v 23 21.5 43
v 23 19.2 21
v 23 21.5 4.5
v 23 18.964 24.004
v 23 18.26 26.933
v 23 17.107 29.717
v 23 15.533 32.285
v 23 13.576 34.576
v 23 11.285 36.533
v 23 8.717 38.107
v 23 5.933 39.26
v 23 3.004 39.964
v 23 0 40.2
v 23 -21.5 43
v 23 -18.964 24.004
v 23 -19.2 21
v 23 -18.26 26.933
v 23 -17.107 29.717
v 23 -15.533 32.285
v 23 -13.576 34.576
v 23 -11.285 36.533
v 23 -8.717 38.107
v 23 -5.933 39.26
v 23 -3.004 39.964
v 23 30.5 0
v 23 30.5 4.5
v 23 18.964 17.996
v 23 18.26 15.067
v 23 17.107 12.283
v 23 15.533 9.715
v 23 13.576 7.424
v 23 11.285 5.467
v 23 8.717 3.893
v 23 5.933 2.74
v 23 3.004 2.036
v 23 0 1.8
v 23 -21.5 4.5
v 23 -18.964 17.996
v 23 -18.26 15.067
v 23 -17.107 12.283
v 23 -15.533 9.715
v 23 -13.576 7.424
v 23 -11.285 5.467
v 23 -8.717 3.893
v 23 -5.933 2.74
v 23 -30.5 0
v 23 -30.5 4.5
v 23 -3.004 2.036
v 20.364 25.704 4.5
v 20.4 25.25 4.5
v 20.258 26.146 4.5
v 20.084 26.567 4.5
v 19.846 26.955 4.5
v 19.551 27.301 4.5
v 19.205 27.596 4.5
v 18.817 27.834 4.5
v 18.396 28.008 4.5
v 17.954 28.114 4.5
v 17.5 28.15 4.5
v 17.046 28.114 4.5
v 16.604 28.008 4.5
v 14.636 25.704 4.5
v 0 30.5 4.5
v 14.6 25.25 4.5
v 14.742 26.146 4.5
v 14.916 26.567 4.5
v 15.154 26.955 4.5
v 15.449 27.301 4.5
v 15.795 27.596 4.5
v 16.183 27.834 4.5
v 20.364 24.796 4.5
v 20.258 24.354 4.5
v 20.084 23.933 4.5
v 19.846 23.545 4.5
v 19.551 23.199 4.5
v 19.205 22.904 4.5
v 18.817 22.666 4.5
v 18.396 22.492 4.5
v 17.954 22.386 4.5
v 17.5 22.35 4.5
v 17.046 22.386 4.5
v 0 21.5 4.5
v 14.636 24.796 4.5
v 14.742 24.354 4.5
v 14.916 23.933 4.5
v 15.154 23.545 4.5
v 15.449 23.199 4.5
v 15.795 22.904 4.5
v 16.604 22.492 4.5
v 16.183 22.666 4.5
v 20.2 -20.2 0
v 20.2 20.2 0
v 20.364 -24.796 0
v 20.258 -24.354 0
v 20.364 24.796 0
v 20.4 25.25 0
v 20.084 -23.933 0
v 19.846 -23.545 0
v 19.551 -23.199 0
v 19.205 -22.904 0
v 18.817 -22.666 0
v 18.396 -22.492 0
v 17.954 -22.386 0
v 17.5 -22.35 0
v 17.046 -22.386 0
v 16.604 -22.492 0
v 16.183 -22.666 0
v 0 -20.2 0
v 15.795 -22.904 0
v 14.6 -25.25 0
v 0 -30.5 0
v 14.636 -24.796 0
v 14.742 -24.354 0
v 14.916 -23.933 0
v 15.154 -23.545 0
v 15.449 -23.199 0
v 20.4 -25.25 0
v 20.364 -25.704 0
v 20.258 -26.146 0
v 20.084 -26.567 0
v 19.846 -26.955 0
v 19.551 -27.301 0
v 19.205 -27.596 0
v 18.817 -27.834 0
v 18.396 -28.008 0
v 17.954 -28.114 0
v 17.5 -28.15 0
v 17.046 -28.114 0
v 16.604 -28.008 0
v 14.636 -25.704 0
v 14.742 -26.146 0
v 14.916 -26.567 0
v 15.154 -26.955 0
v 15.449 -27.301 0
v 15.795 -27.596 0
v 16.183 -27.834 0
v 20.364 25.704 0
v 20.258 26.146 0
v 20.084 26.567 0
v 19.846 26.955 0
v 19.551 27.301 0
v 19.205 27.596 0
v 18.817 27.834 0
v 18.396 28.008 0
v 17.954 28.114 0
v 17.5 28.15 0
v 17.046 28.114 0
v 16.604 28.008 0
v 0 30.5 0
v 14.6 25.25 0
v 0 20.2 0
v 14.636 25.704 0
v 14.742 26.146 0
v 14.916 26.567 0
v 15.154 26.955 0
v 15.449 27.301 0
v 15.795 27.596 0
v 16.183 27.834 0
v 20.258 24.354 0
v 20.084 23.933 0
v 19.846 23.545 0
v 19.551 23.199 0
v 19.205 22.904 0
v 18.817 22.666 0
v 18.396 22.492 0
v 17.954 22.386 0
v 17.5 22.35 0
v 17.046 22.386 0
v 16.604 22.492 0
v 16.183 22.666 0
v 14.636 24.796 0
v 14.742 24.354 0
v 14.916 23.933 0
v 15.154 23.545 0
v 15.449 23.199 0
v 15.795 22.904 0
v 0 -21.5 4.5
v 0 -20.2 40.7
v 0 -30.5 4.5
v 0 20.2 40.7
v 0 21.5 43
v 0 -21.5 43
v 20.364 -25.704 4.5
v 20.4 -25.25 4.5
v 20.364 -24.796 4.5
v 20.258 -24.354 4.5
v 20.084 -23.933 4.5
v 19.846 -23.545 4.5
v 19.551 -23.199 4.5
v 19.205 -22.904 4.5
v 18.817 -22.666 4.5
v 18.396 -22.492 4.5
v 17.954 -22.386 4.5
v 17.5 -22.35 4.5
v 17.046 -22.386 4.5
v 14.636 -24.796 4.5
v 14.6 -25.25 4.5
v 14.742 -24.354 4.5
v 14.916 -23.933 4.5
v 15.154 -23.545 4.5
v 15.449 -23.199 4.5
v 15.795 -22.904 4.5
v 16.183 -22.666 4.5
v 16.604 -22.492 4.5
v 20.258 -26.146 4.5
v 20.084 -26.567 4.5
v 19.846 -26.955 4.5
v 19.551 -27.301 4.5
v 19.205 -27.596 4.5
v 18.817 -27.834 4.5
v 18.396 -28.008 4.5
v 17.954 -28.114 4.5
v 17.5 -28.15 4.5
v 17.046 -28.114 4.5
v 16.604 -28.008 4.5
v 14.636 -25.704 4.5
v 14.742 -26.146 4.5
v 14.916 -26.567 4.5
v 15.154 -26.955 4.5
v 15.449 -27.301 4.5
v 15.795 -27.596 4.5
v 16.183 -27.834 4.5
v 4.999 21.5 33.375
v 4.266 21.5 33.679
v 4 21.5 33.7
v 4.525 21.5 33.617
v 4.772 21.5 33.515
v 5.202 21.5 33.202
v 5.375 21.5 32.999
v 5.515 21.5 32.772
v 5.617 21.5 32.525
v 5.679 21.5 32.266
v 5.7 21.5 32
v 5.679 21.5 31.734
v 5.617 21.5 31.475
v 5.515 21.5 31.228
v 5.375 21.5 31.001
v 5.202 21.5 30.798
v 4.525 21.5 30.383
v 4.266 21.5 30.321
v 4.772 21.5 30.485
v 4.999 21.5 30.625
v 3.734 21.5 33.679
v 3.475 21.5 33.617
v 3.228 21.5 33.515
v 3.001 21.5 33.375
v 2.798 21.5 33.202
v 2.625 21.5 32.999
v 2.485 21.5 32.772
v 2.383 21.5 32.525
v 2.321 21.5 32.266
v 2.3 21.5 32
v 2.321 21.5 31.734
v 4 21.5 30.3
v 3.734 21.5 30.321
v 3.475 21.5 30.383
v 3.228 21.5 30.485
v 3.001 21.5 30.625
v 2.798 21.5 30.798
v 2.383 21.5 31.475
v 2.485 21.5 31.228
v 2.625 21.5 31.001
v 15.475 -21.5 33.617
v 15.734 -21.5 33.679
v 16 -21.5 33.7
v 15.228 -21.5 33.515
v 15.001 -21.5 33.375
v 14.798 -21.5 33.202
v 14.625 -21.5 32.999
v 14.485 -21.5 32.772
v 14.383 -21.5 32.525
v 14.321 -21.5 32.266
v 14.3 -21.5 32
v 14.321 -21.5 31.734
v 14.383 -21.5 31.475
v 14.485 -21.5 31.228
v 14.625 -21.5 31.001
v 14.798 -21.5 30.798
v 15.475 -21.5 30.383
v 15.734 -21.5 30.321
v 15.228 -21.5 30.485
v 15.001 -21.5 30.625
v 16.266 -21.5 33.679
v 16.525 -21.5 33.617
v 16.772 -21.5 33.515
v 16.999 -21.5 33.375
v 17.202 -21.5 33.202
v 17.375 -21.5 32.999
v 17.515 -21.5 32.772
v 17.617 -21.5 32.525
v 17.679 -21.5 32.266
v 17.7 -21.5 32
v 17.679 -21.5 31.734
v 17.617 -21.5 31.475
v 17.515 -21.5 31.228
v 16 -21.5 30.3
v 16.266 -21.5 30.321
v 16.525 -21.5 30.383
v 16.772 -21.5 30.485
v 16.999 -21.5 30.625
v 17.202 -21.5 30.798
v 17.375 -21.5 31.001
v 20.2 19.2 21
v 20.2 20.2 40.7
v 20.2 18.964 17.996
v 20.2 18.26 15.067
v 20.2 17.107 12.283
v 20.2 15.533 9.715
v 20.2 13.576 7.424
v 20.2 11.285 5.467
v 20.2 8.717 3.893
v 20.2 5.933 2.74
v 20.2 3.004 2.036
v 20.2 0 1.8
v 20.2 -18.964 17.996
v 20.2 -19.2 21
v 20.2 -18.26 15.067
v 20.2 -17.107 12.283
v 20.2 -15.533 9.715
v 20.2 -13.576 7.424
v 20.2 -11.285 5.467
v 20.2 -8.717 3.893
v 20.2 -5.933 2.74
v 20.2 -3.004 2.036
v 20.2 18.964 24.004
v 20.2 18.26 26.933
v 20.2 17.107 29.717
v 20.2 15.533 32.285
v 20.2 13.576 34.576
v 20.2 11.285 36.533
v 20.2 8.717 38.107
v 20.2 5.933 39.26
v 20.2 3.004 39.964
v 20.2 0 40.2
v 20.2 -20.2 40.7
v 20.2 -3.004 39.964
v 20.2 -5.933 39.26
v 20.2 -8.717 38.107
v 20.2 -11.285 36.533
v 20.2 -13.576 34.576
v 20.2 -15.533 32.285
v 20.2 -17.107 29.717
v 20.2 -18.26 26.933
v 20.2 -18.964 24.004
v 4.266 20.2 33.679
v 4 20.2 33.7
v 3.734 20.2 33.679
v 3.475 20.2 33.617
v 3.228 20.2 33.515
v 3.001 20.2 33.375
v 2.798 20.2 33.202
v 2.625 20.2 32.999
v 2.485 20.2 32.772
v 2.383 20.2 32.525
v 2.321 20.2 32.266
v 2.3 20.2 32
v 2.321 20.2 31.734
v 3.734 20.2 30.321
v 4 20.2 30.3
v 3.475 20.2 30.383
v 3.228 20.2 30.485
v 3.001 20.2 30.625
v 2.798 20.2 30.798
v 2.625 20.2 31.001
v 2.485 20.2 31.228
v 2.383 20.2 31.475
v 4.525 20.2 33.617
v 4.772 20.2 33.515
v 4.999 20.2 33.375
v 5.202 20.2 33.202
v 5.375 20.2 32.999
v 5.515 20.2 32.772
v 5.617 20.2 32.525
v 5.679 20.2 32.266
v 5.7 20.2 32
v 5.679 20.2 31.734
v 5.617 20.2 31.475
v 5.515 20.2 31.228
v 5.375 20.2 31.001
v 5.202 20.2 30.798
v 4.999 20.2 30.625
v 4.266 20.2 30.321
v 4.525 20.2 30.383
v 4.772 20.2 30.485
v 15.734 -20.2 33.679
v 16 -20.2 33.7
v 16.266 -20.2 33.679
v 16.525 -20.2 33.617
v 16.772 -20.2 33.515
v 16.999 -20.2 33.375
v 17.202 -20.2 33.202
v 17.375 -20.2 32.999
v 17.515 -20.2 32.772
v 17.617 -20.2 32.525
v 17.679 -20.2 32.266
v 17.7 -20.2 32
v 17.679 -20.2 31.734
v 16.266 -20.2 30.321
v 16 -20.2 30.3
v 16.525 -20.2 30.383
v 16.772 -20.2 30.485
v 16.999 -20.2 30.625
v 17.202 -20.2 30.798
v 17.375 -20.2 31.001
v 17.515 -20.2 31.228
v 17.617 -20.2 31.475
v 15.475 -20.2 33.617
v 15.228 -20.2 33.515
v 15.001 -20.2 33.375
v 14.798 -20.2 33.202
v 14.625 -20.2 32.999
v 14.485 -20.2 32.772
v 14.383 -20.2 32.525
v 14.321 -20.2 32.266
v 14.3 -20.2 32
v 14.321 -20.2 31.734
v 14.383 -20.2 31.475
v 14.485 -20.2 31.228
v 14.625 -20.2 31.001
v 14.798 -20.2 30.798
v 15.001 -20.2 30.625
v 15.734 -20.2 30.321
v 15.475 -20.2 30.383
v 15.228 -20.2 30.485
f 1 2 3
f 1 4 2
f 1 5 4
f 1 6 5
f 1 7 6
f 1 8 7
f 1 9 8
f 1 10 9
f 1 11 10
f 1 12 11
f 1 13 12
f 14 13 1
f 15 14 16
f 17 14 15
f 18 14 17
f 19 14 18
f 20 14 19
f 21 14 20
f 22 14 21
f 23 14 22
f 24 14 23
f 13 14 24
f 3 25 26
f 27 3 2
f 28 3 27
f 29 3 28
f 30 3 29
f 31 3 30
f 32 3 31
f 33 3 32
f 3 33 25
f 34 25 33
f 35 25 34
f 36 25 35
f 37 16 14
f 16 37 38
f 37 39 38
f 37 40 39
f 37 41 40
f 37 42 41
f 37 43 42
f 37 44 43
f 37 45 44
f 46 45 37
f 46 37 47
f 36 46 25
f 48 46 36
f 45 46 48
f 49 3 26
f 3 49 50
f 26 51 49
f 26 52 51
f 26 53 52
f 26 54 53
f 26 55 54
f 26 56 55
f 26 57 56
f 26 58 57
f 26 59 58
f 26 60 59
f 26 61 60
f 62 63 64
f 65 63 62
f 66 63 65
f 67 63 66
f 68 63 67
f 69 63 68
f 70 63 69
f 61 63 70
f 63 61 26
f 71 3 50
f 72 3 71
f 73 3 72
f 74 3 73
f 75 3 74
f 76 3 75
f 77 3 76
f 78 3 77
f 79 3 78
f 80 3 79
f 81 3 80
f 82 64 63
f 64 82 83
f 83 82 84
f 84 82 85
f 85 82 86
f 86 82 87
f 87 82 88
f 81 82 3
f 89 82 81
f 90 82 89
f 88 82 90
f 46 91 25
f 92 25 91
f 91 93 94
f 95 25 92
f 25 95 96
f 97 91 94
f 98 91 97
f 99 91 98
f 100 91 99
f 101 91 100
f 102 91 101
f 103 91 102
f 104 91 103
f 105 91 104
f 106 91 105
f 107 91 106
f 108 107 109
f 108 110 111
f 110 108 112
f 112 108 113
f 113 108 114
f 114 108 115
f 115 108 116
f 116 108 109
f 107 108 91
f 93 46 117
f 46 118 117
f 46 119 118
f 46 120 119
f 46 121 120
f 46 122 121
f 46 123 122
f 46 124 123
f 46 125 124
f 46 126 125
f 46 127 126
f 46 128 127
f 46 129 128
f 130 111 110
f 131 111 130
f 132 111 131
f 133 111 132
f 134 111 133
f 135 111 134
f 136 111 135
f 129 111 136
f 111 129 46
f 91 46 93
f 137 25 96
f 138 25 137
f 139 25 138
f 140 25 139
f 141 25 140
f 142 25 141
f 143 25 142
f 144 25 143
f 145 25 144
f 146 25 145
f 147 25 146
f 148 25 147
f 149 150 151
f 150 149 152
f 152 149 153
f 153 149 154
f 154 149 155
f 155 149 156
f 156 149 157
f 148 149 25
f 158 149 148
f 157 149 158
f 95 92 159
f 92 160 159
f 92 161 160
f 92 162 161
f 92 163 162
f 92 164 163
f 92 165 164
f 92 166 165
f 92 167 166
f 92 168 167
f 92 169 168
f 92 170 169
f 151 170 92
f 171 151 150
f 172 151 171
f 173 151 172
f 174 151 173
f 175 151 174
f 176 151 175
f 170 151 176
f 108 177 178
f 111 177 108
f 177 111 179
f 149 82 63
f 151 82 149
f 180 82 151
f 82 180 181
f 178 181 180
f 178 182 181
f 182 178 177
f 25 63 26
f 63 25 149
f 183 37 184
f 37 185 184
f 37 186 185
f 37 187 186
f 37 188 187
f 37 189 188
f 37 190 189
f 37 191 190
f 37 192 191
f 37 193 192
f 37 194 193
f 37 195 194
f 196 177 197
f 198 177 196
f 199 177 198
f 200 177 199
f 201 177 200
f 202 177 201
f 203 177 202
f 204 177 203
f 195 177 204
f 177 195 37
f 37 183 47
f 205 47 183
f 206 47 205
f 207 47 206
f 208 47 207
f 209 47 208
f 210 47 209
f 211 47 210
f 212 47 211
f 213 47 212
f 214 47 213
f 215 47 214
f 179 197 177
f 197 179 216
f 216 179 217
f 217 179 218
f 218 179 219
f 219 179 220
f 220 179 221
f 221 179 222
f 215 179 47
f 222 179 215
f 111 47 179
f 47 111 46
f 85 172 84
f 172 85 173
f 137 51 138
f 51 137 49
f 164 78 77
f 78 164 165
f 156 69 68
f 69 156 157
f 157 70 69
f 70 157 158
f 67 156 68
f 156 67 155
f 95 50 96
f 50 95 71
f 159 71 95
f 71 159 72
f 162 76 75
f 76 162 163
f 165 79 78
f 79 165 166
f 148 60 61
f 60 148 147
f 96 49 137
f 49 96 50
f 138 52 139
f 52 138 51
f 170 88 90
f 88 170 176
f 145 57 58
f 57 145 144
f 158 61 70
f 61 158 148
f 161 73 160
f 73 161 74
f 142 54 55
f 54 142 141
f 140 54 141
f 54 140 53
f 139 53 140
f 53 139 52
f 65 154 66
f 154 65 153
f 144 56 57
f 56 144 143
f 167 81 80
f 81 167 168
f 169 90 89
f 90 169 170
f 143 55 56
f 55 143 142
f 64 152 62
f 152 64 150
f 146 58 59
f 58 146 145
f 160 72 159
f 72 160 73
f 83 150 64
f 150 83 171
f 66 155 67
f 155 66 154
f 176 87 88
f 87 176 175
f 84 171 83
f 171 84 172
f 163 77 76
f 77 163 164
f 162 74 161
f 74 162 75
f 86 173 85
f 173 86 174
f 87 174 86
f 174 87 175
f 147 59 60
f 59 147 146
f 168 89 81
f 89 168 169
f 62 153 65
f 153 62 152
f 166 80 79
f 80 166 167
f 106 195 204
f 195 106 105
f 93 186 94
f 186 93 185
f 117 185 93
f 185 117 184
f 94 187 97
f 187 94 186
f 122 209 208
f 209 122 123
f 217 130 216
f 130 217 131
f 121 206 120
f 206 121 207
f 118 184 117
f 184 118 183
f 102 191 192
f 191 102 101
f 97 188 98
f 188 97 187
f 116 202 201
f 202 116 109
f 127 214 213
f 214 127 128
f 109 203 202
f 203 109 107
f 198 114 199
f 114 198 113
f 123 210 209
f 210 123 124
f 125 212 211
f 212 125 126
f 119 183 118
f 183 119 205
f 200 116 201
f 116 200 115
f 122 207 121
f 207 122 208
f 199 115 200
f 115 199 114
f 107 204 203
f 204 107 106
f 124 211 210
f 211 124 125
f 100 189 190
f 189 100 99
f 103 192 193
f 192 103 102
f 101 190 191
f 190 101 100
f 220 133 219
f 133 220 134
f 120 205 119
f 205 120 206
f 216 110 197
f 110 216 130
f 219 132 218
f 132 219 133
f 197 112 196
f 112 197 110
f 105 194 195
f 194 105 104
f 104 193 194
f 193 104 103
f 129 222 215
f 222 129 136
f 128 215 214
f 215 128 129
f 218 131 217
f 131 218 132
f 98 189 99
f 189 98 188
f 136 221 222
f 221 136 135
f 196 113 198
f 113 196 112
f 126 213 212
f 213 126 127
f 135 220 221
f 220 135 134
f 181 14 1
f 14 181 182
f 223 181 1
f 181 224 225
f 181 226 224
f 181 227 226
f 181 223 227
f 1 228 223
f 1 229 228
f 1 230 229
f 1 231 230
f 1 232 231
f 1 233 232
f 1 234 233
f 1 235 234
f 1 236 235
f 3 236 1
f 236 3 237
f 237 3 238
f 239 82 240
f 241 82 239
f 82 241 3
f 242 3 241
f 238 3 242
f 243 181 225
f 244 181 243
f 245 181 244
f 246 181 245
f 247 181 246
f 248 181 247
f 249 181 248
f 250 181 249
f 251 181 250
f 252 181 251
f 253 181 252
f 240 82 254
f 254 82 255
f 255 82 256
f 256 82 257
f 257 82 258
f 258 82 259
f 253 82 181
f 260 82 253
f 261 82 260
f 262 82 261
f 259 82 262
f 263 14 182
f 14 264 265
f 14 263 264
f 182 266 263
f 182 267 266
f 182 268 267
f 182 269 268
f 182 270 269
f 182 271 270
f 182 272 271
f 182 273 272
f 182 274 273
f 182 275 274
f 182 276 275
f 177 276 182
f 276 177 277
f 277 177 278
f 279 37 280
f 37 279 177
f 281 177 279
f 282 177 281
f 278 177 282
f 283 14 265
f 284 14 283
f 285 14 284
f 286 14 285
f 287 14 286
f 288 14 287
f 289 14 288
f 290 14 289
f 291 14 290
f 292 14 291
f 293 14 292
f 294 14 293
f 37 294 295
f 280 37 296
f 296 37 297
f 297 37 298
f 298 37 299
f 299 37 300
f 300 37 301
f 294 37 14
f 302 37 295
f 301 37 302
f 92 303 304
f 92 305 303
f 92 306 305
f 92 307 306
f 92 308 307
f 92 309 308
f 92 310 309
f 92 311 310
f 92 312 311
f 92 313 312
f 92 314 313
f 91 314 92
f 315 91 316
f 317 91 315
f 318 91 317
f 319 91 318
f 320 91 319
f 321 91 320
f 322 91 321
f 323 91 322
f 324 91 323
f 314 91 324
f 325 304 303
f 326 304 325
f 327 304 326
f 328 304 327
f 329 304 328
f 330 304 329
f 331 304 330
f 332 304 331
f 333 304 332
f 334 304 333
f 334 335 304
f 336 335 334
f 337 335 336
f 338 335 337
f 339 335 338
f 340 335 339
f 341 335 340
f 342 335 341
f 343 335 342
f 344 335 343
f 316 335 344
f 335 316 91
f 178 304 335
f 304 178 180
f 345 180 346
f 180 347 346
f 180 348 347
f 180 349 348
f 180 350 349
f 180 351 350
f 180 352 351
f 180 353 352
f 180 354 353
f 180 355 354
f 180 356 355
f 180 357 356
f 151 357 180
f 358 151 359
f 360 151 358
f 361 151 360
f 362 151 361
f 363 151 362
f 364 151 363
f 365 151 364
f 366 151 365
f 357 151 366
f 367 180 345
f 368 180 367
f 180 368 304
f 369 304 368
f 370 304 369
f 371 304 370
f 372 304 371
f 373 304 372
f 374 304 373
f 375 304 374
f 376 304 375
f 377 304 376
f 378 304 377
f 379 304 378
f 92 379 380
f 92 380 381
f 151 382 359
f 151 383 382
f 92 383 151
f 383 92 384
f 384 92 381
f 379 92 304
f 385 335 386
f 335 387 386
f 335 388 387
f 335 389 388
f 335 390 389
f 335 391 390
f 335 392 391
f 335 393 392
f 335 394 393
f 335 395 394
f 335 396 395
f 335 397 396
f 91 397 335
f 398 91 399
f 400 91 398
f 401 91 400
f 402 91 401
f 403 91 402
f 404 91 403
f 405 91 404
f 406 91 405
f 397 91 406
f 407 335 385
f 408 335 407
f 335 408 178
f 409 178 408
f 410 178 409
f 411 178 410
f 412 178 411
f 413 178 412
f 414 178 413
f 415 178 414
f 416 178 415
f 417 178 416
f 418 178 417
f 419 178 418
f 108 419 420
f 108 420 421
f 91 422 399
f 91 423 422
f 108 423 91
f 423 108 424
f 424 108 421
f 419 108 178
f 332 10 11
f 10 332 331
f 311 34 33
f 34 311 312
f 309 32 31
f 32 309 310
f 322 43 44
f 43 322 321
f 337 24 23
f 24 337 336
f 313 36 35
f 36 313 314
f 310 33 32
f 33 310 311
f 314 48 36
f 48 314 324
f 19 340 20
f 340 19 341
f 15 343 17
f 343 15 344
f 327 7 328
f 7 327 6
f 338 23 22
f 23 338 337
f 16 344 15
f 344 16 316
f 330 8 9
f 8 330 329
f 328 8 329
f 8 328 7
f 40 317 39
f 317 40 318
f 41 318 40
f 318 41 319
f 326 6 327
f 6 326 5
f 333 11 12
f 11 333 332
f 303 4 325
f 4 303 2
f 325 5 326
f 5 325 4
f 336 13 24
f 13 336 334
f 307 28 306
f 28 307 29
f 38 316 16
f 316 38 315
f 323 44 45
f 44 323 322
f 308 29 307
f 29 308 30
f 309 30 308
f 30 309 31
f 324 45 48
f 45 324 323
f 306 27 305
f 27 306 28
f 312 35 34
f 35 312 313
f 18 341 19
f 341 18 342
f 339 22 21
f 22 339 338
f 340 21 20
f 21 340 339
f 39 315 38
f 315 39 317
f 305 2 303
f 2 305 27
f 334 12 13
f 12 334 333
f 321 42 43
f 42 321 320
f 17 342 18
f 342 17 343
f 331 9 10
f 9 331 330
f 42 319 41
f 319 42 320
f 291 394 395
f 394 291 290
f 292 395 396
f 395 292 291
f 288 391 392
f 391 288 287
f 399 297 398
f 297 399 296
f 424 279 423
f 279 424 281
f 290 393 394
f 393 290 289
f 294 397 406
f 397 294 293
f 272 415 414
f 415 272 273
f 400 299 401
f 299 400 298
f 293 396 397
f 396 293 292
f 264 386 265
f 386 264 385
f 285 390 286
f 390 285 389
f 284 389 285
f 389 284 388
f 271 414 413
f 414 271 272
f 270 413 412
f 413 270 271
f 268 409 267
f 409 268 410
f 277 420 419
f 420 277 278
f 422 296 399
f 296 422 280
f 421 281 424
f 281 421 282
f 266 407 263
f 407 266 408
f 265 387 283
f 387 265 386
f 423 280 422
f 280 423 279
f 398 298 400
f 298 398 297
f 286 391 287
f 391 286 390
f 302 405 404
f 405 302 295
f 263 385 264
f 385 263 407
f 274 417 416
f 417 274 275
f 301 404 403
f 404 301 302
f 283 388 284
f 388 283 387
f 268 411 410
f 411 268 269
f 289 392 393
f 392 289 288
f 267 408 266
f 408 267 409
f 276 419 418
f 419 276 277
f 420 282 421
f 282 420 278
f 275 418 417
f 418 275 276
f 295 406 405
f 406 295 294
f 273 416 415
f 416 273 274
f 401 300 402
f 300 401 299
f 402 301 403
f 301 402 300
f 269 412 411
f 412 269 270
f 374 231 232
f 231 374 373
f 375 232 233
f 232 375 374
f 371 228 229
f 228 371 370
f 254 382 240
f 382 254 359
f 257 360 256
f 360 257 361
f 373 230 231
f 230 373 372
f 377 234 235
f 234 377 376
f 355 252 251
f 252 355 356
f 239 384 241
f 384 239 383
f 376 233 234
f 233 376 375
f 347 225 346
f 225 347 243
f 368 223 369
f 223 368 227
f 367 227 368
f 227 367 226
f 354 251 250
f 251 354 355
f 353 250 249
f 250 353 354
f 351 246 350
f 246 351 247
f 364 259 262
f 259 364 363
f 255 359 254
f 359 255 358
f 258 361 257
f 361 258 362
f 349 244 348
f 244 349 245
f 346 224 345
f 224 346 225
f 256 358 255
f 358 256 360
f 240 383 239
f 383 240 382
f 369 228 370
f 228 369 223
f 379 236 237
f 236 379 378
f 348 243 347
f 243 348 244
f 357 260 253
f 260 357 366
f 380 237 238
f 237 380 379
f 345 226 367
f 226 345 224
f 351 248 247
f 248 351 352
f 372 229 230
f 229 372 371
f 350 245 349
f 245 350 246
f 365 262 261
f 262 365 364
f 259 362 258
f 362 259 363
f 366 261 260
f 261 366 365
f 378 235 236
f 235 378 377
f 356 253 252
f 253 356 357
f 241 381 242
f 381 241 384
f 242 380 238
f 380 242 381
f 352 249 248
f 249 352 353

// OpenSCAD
$fn = 40;

/// Variables

Screw_Separation = 50.5;
Screw_From_Wall = 17.5;
Screw_Mount_Height = 5;
Screw_Diameter = 5.4; 
Screw_Mounting_Thickness = 2;
Side_Mount_Pad = 1.6;
Side_Mount_Raise = 3;

Fudge_Print = 0.4;

Fan_WidthHeight = 40;
Fan_Depth = 20;
Fan_Mount_Thickness = 3;
Fan_Diameter = 38;
Cable_Diameter = 3;
Cable_Hole_Height = 8;
Cable_Hole_Depth = 4;

Mount_Platform_Length = 51;
Mount_Platform_Width = 17+(Fan_Mount_Thickness*2);
Mount_Platform_Thickness_Height = 4.5;
Mount_Platform_Thickness_Width = 10;

module Screw_Column (screwdiameter, screwheight, thickness){
    difference (){
        cylinder(d = screwdiameter+thickness, h = screwheight, center=true);
        cylinder(d = screwdiameter, h = screwheight+1, center=true);
    }
}

module Screw_Column_Solid (screwdiameter, screwheight){
        cylinder(d = screwdiameter+Fudge_Print, h = screwheight, center=true);
}

// Create Screw Mounts
module Screw_Mounts (w, l, h, d, t){
    translate ([w, l/2,0])
        Screw_Column (d, h, t); 
    translate ([w, -l/2,0])
        Screw_Column (d, h, t);    
    //translate ([Side_Mount_Pad+t, -l/2,Side_Mount_Raise])
        //rotate ([0,90,0])
            //Screw_Column (d, h, t); 
}

module Mount_Platform (l, w, th, tw){
    difference(){
        union(){
            translate([w/2,l/2,0])
                cube([w,tw,th], center=true);
            translate([w/2,-l/2,0])
                cube([w,tw,th], center=true);
        }
        translate ([Screw_From_Wall, Screw_Separation/2,0])
            Screw_Column_Solid (
                Screw_Diameter, 
                Screw_Mount_Height); 
        translate ([Screw_From_Wall, -Screw_Separation/2,0])
            Screw_Column_Solid (
                Screw_Diameter, 
                Screw_Mount_Height); 
    }
    
}

module Fan_Mount (lw, d){
    difference(){
        translate([Fan_Mount_Thickness/2,0,Fan_Mount_Thickness/2]) 
        cube([d+(Fan_Mount_Thickness),
            lw+Fan_Mount_Thickness,
            lw+Fan_Mount_Thickness], 
            center=true);
        translate([0,0,0])
            cube([d+Fudge_Print,lw+Fudge_Print,lw+Fudge_Print+1], center=true);
        translate([Fan_Mount_Thickness,0,(Fan_WidthHeight-Fan_Diameter)/2])
            rotate([0,90,0])
                cylinder(d=Fan_Diameter+Fudge_Print, h=Fan_Depth+(Fan_Mount_Thickness*4), center=true);
        translate([
            (Fan_Depth/2)-Cable_Hole_Depth,
            -Fan_WidthHeight/2,
            (Fan_WidthHeight/2)-Cable_Hole_Height])
            rotate([90,0,0])
                cylinder(d=Cable_Diameter+Fudge_Print, Fan_Mount_Thickness*2, center=true);
         translate([
            -(Fan_Depth/2)+Cable_Hole_Depth,
            Fan_WidthHeight/2,
            (Fan_WidthHeight/2)-Cable_Hole_Height])
            rotate([90,0,0])
                cylinder(d=Cable_Diameter+Fudge_Print, Fan_Mount_Thickness*2, center=true);
            
    }
    *translate([0,0,0])
    #cube([Fan_Depth,Fan_WidthHeight,Fan_WidthHeight], center=true);
}

//translate([0,0,Screw_Mount_Height/2])
//Screw_Mounts(
//    Screw_From_Wall, 
//    Screw_Separation, 
//    Screw_Mount_Height,
//    Screw_Diameter,
//    Screw_Mounting_Thickness);

translate([0,0,Mount_Platform_Thickness_Height/2])
Mount_Platform (
    Mount_Platform_Length, 
    Mount_Platform_Width, 
    Mount_Platform_Thickness_Height, 
    Mount_Platform_Thickness_Width);

translate([Fan_Depth/2,0,Fan_WidthHeight/2])
Fan_Mount (
    Fan_WidthHeight,
    Fan_Depth);
